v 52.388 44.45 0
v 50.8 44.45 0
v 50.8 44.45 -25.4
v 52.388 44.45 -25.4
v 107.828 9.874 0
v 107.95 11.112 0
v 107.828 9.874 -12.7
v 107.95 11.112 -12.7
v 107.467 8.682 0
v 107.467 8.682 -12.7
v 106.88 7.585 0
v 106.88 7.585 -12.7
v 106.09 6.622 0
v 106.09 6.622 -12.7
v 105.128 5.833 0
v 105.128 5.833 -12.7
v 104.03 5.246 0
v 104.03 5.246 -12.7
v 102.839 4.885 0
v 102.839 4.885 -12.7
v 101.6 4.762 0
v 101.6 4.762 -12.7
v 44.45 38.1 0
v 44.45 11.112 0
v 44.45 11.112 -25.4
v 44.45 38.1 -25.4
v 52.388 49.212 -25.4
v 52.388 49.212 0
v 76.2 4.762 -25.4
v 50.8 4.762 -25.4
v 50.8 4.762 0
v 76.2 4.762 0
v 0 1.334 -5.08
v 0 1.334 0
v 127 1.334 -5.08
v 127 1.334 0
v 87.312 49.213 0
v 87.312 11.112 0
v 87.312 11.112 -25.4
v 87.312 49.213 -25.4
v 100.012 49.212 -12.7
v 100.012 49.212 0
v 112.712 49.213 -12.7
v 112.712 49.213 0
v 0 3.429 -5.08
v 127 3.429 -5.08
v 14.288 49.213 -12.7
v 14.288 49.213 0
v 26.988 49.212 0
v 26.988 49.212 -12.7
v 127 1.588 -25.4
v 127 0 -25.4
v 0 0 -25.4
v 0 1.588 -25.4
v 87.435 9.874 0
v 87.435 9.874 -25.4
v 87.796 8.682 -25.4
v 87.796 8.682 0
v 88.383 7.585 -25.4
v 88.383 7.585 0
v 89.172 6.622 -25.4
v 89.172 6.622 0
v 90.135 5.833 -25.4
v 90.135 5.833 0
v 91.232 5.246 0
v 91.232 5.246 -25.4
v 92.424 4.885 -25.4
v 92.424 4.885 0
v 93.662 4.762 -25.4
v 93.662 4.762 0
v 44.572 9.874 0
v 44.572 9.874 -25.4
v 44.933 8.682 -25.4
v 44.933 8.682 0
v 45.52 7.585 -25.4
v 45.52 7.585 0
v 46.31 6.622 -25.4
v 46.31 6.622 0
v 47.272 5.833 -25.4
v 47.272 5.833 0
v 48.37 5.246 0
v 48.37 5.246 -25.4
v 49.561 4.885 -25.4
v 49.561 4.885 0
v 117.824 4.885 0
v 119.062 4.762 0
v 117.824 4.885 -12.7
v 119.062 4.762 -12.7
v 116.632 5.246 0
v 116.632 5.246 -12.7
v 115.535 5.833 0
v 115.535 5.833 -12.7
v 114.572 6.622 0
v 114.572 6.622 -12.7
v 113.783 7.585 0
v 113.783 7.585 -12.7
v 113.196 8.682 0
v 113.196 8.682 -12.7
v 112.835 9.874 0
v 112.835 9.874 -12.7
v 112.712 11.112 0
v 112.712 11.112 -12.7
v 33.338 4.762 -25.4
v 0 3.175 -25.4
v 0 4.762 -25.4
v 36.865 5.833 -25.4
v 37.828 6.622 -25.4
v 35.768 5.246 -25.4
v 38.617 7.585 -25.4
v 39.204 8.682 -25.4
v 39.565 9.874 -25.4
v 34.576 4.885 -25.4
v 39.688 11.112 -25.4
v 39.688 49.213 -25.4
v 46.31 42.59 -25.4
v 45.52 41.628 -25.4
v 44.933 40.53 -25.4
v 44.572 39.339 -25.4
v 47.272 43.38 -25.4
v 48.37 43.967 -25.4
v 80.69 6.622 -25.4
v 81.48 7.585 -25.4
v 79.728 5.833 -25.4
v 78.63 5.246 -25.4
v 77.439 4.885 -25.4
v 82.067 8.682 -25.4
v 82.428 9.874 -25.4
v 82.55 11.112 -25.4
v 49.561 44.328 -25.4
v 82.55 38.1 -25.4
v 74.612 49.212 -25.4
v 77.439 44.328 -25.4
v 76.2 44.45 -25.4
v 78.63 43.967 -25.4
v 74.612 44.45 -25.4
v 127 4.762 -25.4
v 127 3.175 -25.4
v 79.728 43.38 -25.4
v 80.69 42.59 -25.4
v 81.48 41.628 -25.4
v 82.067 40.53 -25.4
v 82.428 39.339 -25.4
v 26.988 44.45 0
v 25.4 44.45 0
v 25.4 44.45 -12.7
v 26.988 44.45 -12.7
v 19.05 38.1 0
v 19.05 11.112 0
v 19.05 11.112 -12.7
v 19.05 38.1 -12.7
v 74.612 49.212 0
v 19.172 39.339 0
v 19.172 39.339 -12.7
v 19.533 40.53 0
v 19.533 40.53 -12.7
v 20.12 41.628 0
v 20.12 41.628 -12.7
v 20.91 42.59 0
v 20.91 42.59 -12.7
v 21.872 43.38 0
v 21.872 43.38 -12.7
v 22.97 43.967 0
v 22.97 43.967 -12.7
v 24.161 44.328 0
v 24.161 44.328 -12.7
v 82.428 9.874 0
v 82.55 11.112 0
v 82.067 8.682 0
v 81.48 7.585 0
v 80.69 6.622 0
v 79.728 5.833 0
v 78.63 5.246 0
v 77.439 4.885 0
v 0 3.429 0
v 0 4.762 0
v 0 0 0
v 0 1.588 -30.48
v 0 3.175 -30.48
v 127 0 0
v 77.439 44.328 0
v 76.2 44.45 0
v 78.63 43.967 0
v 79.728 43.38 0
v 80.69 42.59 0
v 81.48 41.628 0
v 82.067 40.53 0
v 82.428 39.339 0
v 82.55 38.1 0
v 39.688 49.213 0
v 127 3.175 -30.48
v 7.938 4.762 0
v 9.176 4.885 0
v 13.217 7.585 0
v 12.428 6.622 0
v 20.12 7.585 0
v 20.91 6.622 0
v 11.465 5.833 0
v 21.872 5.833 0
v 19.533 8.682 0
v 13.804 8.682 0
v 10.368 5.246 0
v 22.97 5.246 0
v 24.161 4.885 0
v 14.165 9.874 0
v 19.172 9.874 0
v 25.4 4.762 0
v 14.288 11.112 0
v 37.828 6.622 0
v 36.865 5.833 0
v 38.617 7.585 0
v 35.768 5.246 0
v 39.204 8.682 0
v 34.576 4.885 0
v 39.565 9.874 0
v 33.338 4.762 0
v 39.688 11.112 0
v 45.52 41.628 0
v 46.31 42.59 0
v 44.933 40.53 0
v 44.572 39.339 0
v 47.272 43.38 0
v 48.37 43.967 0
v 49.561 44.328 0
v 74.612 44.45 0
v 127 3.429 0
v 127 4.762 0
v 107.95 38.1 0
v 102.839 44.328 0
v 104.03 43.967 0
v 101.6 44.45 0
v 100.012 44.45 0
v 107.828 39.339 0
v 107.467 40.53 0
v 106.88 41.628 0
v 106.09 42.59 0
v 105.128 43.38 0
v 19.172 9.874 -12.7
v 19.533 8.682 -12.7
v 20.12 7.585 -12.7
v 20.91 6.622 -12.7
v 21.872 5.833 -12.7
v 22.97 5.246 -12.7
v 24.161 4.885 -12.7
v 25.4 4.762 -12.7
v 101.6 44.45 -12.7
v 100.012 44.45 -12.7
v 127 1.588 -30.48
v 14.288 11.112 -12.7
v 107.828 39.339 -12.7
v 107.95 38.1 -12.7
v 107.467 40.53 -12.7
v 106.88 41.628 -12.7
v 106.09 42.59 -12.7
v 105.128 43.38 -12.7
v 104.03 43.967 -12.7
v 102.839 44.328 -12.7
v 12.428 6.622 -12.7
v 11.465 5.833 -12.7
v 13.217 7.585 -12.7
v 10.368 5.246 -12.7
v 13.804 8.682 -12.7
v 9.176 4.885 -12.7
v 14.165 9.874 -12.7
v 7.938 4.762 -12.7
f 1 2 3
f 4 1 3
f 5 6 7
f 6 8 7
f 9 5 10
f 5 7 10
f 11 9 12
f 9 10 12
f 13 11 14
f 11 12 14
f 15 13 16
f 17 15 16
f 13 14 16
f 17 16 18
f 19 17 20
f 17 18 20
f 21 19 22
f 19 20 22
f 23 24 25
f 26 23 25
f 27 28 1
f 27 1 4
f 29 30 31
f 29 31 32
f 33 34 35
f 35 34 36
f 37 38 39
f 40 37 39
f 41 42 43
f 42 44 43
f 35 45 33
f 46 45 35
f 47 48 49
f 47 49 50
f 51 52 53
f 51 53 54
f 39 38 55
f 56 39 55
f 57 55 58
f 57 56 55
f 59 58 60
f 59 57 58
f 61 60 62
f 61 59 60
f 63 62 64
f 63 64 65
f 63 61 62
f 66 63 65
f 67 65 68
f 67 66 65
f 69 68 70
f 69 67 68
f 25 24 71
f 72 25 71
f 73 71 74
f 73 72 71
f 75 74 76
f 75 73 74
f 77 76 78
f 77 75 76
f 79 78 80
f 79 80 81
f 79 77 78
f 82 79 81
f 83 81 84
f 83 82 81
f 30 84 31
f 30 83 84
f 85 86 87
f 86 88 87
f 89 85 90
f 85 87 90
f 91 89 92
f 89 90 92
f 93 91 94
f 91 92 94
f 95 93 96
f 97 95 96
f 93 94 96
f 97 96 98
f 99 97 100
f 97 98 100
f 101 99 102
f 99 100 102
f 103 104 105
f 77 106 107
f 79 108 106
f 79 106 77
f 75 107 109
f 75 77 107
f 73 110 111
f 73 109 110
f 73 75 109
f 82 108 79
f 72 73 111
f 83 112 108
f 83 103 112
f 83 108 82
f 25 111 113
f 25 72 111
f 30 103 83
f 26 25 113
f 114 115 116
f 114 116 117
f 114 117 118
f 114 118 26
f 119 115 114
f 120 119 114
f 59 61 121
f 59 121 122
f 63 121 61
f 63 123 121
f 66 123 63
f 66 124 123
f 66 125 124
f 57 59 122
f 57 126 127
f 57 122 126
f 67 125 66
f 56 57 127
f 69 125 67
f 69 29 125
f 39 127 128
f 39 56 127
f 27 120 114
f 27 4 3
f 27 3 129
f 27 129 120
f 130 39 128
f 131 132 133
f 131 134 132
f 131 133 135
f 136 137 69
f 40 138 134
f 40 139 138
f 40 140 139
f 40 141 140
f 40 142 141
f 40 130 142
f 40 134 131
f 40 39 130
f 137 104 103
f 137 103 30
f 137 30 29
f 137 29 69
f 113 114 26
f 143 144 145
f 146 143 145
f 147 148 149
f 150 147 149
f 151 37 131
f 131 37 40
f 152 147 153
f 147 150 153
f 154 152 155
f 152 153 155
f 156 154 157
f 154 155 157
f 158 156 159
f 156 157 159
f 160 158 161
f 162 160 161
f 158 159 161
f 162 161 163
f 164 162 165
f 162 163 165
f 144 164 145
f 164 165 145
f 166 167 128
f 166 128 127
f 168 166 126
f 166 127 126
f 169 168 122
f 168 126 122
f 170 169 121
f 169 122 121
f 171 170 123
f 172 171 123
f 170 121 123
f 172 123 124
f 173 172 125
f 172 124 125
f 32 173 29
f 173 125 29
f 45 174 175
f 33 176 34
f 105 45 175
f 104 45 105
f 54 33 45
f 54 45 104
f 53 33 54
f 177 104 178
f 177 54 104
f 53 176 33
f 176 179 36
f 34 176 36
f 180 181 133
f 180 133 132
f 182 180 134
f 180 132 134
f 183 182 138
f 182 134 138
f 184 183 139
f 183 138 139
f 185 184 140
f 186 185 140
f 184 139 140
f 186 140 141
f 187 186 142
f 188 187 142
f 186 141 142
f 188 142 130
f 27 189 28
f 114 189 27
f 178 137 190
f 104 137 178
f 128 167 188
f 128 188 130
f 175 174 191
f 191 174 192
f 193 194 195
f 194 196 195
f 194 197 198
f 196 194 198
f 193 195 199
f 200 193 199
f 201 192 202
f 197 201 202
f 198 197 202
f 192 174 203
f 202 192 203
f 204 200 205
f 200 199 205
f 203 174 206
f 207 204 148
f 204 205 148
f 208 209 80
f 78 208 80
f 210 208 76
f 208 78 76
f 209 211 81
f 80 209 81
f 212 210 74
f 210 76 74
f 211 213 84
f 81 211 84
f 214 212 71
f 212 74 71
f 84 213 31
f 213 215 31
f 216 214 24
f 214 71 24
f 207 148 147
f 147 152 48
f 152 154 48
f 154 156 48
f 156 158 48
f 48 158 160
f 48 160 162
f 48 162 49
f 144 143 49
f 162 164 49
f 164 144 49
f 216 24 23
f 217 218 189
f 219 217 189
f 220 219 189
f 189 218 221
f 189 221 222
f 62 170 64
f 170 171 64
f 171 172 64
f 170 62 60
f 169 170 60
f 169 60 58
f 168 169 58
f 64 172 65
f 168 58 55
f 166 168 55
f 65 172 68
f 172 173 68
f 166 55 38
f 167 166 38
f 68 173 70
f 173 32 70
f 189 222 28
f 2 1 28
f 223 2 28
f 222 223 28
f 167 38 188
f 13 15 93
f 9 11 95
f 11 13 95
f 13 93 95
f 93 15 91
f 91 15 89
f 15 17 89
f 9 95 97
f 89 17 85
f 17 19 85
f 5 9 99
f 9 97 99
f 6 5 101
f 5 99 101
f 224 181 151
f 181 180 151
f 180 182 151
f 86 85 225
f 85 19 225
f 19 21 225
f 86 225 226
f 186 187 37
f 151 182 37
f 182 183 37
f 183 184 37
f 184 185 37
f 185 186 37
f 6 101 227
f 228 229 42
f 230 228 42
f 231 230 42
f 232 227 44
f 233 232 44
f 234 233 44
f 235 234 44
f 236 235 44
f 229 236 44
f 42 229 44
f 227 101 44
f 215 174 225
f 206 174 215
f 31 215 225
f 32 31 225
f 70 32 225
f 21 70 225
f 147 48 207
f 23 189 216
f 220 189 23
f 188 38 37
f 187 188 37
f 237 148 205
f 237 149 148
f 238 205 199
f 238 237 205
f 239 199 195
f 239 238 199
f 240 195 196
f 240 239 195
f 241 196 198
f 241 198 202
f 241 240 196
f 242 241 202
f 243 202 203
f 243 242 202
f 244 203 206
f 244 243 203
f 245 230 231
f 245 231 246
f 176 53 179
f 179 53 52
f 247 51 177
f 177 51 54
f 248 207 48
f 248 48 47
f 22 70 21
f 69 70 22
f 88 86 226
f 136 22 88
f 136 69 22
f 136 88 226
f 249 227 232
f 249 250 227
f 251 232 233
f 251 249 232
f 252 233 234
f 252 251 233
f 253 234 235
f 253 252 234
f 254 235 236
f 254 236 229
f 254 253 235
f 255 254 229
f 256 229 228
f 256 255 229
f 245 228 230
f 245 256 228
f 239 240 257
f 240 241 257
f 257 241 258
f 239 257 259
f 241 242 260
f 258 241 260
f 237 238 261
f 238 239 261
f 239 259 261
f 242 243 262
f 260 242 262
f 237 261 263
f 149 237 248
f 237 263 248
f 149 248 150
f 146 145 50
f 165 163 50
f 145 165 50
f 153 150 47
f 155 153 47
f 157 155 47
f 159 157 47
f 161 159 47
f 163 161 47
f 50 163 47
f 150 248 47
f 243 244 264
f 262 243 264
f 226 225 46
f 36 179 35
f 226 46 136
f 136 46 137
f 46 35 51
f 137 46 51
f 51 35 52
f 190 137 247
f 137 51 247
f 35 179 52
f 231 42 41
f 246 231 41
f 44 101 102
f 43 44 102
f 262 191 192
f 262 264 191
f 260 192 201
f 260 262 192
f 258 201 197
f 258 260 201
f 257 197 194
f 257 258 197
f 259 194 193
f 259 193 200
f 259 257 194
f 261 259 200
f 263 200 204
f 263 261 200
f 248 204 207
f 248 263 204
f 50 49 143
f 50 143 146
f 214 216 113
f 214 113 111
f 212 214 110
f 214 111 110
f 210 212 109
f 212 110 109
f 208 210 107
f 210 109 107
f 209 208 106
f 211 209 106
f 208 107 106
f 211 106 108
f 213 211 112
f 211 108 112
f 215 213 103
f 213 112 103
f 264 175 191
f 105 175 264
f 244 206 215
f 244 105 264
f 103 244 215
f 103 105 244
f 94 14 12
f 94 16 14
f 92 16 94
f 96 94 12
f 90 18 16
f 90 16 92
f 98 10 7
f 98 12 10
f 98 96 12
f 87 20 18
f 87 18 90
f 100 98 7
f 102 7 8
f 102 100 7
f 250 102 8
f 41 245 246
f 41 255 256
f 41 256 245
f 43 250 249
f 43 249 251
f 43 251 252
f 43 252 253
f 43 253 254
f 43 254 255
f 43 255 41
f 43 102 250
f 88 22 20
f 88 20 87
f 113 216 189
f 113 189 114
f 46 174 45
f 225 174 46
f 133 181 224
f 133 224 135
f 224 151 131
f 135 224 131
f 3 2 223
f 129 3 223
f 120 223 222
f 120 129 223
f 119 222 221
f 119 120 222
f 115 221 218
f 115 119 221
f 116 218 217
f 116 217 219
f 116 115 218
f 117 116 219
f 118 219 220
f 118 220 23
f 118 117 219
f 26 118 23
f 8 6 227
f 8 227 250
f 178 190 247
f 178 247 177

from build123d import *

# Parameters (mm, degrees)
SKETCH1_W            = 127
SKETCH1_H            = 25.4
BOSS_EXTRUDE1_DEPTH  = 4.7625
SKETCH2_W            = 4.7625
SKETCH2_H            = 25.4
SKETCH2_H_2          = 12.7
BOSS_EXTRUDE2_DEPTH  = 44.45
SKETCH3_W            = 25.4
SKETCH3_H            = 4.7625
BOSS_EXTRUDE3_DEPTH  = 7.9375
SKETCH4_W            = 12.7
SKETCH4_H            = 4.7625
BOSS_EXTRUDE4_DEPTH  = 7.9375
FILLET1_R            = 6.35
FILLET1_OF_MIRROR1_R = 6.35
SKETCH5_W            = 127
SKETCH5_H            = 2.0955
CUT_EXTRUDE1_DEPTH   = 5.08
SKETCH6_W            = 127
SKETCH6_H            = 1.5875
BOSS_EXTRUDE5_DEPTH  = 5.08


with BuildPart() as part:
    # Sketch1 → Boss-Extrude1 (new body)
    with BuildSketch(Plane(origin=(0, 0, 0), x_dir=(1, 0, 0), z_dir=(0, 1, 0))):
        with Locations((63.5, 12.7)):
            Rectangle(SKETCH1_W, SKETCH1_H)
    extrude(amount=BOSS_EXTRUDE1_DEPTH)

    # Sketch2 → Boss-Extrude2 (add)
    with BuildSketch(Plane(origin=(0, 4.7625, 0), x_dir=(1, 0, 0), z_dir=(0, 1, 0))):
        with Locations((42.06875, 12.7)):
            Rectangle(SKETCH2_W, SKETCH2_H)
        with Locations((16.66875, 6.35)):
            Rectangle(SKETCH2_W, SKETCH2_H_2)
    boss_extrude2 = extrude(amount=BOSS_EXTRUDE2_DEPTH)

    # Sketch3 → Boss-Extrude3 (add)
    with BuildSketch(Plane(origin=(44.45, 0, 0), x_dir=(0, 0, -1), z_dir=(1, 0, 0))):
        with Locations((12.7, 46.83125)):
            Rectangle(SKETCH3_W, SKETCH3_H)
    boss_extrude3 = extrude(amount=BOSS_EXTRUDE3_DEPTH)

    # Sketch4 → Boss-Extrude4 (add)
    with BuildSketch(Plane(origin=(19.05, 0, 0), x_dir=(0, 0, -1), z_dir=(1, 0, 0))):
        with Locations((6.35, 46.83125)):
            Rectangle(SKETCH4_W, SKETCH4_H)
    boss_extrude4 = extrude(amount=BOSS_EXTRUDE4_DEPTH)

    # Fillet1
    fillet1_edges = [part.edges().sort_by_distance(p)[0] for p in [
        (39.6875, 4.7625, -12.7),
        (44.45, 4.7625, -12.7),
        (19.05, 4.7625, -6.35),
        (14.2875, 4.7625, -6.35),
        (44.45, 44.45, -12.7),
        (19.05, 44.45, -6.35),
    ]]
    fillet(fillet1_edges, radius=FILLET1_R)

    # Mirror1: Boss-Extrude2, Boss-Extrude3, Boss-Extrude4 across plane
    add(boss_extrude2.mirror(Plane(origin=(63.5, 0, 0), x_dir=(0, 0, 1), z_dir=(1, 0, 0))))
    add(boss_extrude3.mirror(Plane(origin=(63.5, 0, 0), x_dir=(0, 0, 1), z_dir=(1, 0, 0))))
    add(boss_extrude4.mirror(Plane(origin=(63.5, 0, 0), x_dir=(0, 0, 1), z_dir=(1, 0, 0))))

    # Fillet1 of Mirror1
    fillet1_of_mirror1_edges = [part.edges().sort_by_distance(p)[0] for p in [
        (87.3125, 4.7625, -12.7),
        (82.55, 4.7625, -12.7),
        (107.95, 4.7625, -6.35),
        (112.7125, 4.7625, -6.35),
        (82.55, 44.45, -12.7),
        (107.95, 44.45, -6.35),
    ]]
    fillet(fillet1_of_mirror1_edges, radius=FILLET1_OF_MIRROR1_R)

    # Sketch5 → Cut-Extrude1 (cut)
    with BuildSketch(Plane.XY):
        with Locations((63.5, 2.38125)):
            Rectangle(SKETCH5_W, SKETCH5_H)
    extrude(amount=-CUT_EXTRUDE1_DEPTH, mode=Mode.SUBTRACT)

    # Sketch6 → Boss-Extrude5 (add)
    with BuildSketch(Plane(origin=(0, 0, -25.4), x_dir=(-1, 0, 0), z_dir=(0, 0, -1))):
        with Locations((-63.5, 2.38125)):
            Rectangle(SKETCH6_W, SKETCH6_H)
    extrude(amount=BOSS_EXTRUDE5_DEPTH)


solid = part.part
